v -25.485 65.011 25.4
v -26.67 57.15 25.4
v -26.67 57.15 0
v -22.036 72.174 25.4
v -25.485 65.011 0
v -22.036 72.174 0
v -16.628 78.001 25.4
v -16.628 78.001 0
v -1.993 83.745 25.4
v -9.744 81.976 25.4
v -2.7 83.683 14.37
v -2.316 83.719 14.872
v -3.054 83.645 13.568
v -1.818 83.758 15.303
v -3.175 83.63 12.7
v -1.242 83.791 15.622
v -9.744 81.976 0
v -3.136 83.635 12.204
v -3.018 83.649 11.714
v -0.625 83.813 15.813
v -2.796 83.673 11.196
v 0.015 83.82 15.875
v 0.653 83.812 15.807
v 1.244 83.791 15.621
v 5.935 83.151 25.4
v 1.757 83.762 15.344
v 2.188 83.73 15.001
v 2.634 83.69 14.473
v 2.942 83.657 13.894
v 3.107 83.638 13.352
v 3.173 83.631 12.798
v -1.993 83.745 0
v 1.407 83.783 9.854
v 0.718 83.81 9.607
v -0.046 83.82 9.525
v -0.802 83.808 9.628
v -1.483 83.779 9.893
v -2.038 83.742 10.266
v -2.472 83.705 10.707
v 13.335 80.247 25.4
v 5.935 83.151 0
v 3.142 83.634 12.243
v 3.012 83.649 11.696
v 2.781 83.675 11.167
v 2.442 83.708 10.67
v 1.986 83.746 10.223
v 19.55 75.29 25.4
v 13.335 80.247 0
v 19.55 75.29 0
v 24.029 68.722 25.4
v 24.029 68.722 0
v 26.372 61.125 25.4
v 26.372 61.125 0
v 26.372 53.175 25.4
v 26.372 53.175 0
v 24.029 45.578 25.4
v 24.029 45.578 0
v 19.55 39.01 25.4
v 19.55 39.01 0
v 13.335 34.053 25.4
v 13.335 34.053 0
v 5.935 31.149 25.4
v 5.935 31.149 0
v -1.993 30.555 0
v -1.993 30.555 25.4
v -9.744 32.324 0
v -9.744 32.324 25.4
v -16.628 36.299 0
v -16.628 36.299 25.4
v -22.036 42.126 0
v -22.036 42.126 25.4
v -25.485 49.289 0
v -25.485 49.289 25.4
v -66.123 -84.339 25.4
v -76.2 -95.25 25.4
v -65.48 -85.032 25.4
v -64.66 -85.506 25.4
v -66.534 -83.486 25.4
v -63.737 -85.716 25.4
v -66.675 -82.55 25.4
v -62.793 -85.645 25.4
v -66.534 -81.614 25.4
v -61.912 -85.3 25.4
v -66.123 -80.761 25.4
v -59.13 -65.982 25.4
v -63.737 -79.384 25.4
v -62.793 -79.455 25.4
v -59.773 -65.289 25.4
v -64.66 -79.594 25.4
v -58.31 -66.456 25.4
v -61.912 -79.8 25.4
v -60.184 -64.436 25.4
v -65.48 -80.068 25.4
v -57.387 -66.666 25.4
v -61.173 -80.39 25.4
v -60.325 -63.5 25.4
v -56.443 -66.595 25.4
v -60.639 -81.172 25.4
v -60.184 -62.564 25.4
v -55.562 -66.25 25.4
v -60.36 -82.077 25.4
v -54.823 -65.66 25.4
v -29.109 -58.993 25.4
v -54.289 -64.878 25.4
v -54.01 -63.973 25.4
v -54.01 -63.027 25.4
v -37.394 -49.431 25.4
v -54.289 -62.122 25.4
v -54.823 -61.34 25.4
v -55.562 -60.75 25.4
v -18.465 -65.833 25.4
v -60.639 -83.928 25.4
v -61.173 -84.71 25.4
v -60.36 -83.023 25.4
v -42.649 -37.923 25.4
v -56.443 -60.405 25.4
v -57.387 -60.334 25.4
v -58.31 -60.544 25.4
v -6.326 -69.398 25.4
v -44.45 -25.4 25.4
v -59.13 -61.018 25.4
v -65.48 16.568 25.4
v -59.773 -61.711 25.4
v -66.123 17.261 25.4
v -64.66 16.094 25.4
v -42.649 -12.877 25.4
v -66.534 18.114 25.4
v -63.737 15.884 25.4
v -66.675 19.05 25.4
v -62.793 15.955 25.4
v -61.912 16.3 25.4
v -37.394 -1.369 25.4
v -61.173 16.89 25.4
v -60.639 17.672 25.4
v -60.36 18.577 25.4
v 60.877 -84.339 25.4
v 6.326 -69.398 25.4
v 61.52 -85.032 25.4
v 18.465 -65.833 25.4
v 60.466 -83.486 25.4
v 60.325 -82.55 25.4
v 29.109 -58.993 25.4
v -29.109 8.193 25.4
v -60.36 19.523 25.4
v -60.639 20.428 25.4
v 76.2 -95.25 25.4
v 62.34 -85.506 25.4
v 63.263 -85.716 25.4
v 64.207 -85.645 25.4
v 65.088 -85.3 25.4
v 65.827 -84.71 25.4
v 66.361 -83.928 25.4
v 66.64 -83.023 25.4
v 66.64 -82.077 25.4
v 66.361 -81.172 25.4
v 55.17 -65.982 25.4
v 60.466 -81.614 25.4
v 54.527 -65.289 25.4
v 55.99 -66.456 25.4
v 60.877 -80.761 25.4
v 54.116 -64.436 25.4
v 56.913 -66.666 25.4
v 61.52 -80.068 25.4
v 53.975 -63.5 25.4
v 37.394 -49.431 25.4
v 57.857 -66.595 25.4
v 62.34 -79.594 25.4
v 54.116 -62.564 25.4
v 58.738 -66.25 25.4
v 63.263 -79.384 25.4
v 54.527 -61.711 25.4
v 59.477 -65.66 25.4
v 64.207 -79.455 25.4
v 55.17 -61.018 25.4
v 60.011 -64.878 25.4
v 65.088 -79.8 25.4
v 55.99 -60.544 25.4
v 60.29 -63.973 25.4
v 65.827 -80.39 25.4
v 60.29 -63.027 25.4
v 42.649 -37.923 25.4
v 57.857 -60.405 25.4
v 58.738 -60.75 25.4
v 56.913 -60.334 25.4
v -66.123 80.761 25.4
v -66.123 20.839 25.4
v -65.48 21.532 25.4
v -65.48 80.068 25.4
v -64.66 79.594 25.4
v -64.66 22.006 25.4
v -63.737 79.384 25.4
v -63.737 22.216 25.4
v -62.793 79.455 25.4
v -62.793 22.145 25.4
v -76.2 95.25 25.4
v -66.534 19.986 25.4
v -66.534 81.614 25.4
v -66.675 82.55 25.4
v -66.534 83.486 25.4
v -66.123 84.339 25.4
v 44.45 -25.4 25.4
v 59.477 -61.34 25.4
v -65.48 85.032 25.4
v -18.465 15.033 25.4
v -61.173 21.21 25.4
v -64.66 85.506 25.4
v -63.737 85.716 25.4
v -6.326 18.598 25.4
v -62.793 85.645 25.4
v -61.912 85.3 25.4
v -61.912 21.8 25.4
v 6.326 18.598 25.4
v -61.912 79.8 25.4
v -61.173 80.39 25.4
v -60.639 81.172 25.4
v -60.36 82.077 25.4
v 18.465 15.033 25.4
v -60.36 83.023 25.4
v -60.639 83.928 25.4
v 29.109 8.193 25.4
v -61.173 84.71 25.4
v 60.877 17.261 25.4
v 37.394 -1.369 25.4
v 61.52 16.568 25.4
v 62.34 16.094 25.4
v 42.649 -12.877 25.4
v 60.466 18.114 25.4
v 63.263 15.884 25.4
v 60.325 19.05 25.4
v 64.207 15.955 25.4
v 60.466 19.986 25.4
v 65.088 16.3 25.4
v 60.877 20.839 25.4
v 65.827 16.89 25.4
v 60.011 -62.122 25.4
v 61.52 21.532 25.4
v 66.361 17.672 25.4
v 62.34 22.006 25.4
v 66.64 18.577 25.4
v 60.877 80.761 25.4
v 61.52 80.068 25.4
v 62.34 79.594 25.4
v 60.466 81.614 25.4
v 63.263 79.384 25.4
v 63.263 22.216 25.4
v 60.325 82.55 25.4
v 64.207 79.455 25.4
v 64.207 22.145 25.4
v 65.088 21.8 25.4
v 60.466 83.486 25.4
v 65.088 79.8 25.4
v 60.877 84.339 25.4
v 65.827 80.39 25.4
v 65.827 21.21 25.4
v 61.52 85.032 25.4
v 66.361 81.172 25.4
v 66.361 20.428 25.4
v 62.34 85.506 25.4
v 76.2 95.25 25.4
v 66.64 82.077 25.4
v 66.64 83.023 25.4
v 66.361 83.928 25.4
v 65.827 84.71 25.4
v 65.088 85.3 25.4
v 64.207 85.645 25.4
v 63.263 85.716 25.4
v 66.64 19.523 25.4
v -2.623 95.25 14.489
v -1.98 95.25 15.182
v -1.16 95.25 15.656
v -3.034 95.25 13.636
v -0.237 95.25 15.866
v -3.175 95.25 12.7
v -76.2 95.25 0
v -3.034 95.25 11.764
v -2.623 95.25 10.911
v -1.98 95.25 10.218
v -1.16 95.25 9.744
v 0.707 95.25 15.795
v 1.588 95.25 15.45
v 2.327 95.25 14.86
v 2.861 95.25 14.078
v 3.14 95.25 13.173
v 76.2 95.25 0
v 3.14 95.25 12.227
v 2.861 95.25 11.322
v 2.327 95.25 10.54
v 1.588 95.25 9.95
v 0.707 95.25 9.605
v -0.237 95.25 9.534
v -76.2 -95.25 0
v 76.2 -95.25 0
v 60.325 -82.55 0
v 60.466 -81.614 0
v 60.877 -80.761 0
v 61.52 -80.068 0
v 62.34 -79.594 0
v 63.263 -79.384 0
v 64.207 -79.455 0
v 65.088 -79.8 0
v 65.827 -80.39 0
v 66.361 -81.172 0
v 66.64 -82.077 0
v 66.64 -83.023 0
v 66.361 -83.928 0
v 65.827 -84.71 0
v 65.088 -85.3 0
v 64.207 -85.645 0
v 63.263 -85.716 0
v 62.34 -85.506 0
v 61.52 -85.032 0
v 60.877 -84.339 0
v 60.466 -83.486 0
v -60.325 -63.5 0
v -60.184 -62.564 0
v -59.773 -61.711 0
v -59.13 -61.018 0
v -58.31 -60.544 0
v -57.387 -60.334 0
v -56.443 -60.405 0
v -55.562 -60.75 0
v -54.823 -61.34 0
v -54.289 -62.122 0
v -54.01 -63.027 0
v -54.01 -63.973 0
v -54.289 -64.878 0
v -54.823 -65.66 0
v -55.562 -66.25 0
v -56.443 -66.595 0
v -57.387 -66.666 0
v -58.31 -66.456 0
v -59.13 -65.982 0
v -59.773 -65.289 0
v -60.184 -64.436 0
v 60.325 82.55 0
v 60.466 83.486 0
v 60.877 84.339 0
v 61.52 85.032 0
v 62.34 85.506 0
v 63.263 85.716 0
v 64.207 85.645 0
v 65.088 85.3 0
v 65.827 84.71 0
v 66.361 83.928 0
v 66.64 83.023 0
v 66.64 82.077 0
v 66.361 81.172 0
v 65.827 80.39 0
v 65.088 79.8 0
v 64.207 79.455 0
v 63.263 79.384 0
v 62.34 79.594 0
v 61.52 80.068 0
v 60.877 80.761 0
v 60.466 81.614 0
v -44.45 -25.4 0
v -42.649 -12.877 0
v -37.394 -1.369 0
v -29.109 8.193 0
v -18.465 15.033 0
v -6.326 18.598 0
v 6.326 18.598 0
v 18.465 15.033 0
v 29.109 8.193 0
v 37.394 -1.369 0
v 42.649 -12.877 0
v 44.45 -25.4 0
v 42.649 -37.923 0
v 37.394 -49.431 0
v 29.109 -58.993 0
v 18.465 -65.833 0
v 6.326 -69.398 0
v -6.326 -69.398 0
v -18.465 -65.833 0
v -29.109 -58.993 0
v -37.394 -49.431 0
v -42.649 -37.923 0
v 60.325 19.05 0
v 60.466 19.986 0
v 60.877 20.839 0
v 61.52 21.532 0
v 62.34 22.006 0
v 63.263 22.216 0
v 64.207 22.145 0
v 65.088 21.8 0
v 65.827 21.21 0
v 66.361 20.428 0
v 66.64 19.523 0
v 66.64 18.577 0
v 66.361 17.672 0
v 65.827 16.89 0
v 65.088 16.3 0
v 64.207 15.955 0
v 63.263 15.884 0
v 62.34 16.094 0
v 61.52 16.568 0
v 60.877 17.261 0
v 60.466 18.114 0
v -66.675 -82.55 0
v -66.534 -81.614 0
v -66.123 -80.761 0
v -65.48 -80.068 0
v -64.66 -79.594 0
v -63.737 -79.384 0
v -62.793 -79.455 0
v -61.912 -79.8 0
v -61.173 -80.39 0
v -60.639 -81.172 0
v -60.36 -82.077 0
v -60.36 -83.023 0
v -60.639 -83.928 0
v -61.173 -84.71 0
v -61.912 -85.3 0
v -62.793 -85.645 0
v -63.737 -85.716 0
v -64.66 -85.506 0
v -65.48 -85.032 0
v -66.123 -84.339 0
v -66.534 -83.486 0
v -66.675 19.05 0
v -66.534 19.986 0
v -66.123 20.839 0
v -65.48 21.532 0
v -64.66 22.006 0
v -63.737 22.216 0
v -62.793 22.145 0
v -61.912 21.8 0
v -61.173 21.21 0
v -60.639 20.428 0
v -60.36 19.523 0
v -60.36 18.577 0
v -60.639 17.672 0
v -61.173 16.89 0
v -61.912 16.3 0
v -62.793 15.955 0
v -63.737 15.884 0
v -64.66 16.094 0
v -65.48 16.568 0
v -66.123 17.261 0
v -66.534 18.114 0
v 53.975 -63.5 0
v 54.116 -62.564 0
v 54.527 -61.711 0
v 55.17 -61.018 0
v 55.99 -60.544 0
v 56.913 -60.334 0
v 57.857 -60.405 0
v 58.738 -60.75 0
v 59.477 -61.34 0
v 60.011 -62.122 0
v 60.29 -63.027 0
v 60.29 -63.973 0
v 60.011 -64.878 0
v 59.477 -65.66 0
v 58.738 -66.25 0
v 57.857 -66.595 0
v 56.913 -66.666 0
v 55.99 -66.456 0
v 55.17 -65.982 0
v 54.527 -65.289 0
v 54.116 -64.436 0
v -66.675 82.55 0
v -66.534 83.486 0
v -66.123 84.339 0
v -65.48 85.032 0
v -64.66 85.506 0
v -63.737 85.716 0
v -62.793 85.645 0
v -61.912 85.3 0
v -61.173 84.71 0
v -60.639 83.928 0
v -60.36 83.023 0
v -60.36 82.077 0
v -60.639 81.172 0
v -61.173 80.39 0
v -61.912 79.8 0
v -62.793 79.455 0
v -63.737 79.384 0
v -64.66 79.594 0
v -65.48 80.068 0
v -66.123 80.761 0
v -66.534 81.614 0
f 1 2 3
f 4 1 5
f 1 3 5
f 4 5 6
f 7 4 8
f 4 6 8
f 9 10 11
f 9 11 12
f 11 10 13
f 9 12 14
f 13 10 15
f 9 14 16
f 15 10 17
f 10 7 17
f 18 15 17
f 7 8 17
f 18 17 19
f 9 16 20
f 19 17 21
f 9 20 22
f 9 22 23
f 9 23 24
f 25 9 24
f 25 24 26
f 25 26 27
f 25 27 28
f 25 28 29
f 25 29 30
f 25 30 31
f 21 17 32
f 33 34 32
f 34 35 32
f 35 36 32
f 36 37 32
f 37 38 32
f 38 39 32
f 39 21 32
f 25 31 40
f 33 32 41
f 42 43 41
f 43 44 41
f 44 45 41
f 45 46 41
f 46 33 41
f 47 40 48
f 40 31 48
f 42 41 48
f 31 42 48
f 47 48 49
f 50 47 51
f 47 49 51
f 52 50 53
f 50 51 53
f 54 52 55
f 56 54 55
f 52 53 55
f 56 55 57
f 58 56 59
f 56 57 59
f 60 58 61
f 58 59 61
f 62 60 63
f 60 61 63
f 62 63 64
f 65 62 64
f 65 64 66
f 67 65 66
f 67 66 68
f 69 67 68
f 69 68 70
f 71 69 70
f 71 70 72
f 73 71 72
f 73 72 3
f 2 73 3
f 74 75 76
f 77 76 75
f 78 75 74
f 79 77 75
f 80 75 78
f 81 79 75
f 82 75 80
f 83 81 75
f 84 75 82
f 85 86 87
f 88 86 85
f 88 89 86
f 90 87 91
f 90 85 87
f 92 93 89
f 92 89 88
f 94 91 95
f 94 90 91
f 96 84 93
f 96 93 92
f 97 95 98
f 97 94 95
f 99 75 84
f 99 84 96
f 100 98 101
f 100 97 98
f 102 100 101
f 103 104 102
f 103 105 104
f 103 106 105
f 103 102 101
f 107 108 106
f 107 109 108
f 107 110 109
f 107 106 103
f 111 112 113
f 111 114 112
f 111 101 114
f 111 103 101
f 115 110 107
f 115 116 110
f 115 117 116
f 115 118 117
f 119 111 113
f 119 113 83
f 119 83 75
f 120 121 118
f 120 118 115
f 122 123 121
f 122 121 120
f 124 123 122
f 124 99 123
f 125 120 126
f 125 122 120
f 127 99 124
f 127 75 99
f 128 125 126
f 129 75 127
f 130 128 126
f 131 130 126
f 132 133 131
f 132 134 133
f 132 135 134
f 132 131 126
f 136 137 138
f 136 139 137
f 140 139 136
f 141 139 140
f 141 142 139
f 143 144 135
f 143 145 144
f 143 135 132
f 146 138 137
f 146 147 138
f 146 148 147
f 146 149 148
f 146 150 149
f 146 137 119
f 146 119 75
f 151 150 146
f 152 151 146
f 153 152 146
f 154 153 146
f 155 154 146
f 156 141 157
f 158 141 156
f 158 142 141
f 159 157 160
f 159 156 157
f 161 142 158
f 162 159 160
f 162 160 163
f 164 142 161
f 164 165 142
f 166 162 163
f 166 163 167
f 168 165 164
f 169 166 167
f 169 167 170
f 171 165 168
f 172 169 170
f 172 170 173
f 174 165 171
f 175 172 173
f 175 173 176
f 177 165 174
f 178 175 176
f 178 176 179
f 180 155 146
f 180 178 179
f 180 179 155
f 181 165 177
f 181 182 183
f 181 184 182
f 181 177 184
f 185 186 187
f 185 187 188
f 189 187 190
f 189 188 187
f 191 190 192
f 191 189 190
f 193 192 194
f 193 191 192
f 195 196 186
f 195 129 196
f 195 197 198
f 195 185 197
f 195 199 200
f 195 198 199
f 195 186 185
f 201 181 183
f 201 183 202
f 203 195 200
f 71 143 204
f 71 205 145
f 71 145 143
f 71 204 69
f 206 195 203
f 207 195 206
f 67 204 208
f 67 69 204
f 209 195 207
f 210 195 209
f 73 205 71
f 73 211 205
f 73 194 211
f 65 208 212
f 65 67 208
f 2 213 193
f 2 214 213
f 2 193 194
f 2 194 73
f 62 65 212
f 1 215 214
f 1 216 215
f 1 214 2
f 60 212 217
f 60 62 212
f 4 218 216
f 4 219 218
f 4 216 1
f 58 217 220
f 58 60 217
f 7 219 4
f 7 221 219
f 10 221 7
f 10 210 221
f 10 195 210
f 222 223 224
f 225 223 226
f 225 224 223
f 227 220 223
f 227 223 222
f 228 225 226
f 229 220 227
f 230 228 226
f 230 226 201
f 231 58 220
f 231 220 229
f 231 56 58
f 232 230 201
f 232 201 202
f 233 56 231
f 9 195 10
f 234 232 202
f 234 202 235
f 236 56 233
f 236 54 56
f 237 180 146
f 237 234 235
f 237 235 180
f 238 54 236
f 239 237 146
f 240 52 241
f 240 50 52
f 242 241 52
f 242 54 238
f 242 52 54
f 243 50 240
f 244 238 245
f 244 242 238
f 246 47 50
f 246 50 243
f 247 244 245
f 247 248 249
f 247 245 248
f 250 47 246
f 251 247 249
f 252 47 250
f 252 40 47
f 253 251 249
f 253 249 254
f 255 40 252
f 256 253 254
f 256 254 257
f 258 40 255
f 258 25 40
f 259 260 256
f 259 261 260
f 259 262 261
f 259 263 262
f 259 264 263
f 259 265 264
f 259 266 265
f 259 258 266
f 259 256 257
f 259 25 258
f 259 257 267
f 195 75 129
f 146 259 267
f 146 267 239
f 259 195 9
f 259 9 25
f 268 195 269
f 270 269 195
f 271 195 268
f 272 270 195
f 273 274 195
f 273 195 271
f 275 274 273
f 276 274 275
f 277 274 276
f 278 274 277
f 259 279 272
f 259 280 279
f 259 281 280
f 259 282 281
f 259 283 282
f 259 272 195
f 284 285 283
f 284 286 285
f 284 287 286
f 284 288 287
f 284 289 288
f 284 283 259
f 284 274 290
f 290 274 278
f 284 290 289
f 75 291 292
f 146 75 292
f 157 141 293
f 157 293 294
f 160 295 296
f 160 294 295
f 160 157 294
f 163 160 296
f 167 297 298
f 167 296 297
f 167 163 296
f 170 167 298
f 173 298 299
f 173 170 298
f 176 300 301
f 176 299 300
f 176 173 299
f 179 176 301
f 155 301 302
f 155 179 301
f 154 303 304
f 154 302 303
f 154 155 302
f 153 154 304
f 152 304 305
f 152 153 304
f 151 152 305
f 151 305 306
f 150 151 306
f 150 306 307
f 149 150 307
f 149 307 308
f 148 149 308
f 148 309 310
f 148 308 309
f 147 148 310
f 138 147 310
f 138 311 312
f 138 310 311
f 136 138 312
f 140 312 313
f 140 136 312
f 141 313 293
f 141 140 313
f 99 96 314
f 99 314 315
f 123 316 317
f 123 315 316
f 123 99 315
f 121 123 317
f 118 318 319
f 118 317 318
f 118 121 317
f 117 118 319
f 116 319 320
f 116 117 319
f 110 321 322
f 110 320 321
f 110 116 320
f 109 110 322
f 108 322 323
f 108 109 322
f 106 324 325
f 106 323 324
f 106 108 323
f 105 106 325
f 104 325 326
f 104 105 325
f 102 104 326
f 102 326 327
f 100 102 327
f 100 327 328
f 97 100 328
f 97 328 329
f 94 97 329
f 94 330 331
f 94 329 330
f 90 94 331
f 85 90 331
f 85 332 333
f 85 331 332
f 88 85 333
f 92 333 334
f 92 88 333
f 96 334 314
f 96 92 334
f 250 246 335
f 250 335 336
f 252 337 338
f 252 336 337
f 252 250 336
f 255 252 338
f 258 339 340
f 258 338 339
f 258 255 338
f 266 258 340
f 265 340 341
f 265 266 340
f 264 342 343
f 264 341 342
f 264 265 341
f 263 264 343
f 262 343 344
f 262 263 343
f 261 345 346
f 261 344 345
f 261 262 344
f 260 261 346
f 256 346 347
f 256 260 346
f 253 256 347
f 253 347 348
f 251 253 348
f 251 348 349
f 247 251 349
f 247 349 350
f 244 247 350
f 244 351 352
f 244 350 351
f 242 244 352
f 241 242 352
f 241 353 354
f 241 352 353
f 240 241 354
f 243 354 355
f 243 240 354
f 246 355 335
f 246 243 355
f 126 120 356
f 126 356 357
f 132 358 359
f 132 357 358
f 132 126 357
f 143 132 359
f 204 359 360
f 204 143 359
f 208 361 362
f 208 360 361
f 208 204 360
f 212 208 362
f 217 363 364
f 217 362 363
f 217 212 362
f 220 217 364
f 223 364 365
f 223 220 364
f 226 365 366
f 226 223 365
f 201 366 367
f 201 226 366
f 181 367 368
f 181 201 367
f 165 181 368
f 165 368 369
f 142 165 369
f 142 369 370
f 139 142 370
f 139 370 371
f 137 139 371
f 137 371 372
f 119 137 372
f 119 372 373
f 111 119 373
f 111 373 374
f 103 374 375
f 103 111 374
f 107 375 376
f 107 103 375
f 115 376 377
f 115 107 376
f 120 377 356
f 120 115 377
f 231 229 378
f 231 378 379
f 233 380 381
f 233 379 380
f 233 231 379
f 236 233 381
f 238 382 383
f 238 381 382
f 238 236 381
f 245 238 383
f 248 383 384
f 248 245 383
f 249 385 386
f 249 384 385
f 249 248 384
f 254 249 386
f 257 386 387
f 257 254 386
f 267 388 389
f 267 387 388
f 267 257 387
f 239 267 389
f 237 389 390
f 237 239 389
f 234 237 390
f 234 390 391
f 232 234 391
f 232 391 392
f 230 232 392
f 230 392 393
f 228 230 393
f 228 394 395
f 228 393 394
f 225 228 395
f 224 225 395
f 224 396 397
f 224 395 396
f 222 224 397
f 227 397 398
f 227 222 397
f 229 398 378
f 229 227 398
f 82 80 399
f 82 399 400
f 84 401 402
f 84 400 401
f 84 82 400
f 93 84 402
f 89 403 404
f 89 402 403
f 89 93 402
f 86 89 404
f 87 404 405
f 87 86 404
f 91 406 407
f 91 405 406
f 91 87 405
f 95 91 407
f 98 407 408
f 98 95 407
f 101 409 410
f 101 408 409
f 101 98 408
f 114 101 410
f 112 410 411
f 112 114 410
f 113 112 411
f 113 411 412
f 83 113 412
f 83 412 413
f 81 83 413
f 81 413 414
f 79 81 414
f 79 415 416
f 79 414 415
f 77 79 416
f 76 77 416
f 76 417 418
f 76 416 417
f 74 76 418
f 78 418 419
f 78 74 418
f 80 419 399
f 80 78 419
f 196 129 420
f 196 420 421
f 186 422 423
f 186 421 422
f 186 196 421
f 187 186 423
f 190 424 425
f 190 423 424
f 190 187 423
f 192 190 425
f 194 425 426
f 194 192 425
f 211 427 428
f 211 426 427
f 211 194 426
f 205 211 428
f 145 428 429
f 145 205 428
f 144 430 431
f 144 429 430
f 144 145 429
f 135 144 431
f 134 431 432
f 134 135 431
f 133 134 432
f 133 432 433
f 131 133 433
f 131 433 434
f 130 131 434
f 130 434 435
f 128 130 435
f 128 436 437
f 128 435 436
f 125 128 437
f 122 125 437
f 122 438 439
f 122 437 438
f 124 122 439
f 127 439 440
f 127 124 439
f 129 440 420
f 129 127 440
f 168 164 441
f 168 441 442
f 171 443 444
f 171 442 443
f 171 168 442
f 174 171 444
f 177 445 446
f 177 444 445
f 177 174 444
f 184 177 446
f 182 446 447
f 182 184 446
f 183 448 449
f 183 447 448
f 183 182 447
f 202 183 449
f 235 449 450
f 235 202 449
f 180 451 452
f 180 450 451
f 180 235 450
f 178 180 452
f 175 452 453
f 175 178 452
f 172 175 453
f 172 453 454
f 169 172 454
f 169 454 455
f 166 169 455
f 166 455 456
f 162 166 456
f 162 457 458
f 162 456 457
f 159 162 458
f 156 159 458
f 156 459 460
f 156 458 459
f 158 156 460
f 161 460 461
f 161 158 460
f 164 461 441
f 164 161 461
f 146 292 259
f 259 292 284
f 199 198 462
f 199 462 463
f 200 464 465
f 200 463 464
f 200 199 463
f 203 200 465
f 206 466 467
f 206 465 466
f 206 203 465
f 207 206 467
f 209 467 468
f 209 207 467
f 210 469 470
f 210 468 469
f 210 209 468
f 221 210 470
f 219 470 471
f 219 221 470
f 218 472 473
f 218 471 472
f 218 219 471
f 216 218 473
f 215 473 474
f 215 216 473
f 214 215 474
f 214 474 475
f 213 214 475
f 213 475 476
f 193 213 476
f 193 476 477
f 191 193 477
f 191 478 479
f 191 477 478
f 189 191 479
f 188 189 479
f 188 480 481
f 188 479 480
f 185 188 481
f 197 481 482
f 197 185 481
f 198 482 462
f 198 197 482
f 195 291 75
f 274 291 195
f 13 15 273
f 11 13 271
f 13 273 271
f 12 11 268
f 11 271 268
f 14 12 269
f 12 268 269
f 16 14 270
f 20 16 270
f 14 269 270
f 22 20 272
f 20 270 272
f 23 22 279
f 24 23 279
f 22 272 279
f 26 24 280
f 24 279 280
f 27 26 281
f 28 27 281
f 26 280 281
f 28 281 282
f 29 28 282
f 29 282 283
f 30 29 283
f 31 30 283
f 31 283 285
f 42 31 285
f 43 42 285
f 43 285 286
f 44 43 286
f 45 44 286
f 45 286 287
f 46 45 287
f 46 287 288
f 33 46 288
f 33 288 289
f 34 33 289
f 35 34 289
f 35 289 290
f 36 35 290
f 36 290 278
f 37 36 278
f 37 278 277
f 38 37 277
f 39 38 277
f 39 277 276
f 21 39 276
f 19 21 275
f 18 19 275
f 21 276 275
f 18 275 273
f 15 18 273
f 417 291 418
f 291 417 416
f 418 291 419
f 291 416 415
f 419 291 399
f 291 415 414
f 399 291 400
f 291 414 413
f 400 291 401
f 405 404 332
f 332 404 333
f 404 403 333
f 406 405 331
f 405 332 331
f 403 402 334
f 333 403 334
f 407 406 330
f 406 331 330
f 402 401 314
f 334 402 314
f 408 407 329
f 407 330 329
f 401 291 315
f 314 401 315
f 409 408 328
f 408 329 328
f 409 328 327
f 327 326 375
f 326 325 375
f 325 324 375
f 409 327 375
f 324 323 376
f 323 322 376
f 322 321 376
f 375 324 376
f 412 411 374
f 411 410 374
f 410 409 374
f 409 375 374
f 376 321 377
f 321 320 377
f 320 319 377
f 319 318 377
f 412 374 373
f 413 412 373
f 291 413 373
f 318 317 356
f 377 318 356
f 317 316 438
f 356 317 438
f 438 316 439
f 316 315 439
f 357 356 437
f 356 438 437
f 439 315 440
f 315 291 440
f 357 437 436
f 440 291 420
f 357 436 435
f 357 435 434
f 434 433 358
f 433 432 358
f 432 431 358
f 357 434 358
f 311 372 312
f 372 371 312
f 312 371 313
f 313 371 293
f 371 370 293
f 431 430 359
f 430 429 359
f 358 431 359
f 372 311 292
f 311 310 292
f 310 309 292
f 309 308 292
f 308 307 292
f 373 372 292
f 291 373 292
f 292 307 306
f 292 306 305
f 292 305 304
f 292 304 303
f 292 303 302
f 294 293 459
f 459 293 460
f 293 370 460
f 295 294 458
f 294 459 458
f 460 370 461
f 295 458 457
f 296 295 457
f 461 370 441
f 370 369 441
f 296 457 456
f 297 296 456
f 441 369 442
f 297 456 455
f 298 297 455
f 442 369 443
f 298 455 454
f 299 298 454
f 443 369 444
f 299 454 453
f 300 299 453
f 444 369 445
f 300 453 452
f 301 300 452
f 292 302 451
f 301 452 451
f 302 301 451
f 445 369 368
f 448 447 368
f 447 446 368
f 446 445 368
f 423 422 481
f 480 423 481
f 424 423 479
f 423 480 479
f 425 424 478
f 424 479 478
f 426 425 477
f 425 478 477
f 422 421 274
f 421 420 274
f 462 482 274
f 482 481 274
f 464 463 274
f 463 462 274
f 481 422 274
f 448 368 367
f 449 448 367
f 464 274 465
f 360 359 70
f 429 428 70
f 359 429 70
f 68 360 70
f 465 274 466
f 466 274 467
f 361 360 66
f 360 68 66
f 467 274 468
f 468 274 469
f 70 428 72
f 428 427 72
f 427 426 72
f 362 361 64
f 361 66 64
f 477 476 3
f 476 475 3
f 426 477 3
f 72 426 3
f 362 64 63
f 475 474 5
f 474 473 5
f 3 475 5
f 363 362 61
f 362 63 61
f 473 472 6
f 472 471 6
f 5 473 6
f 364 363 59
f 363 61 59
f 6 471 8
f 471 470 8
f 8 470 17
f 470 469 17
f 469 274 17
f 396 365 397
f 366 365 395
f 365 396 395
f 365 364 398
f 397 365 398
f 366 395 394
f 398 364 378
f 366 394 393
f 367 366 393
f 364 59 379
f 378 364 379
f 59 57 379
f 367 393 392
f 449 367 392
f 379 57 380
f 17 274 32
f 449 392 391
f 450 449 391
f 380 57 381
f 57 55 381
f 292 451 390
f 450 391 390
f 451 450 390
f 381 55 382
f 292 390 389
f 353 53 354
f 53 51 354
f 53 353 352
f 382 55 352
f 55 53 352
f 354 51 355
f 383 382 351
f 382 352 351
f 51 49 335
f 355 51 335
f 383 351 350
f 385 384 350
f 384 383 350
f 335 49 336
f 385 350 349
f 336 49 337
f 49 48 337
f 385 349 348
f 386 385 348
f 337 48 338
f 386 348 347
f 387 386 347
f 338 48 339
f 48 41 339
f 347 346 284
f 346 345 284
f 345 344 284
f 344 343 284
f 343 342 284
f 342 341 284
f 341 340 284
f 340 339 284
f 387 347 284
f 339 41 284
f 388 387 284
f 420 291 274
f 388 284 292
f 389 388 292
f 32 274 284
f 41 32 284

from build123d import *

# Parameters (mm, degrees)
SKETCH1_W               = 152.4
SKETCH1_H               = 190.5
BOSS_EXTRUDE1_DEPTH     = 25.4
SKETCH2_R               = 26.67
CUT_EXTRUDE1_DEPTH      = 125.595997127
CUT_EXTRUDE3_DEPTH      = 125.595997127
CUT_EXTRUDE3_DEPTH_BACK = 125.595997127
SKETCH3_R               = 3.175
CUT_EXTRUDE4_DEPTH      = 125.595997127
CUT_EXTRUDE4_DEPTH_BACK = 125.595997127
SKETCH4_R               = 44.45
CUT_EXTRUDE5_DEPTH      = 125.595997127
CUT_EXTRUDE5_DEPTH_BACK = 125.595997127
SKETCH6_R               = 3.175
CUT_EXTRUDE6_DEPTH      = 125.595997127
CUT_EXTRUDE6_DEPTH_BACK = 125.595997127
SKETCH7_R               = 3.175
SKETCH8_R               = 3.175
CUT_EXTRUDE7_DEPTH      = 25.4


with BuildPart() as part:
    # Sketch1 → Boss-Extrude1 (new body)
    with BuildSketch(Plane.XY):
        Rectangle(SKETCH1_W, SKETCH1_H)
    extrude(amount=BOSS_EXTRUDE1_DEPTH)

    # Sketch2 → Cut-Extrude1 (cut, through all)
    with BuildSketch(Plane(origin=(0, 0, 0), x_dir=(-1, 0, 0), z_dir=(0, 0, -1))):
        with Locations((0, 57.15)):
            Circle(SKETCH2_R)
    extrude(amount=-CUT_EXTRUDE1_DEPTH, mode=Mode.SUBTRACT)

    # Sketch3 → Cut-Extrude3 (cut, two sides: drawn at the far end of the back side and taken through both)
    with BuildSketch(Plane(origin=(0, 0, 0), x_dir=(-1, 0, 0), z_dir=(0, 0, -1)).offset(-CUT_EXTRUDE3_DEPTH_BACK)):
        with Locations((-63.5, 82.55)):
            Circle(SKETCH3_R)
        with Locations((63.5, 82.55)):
            Circle(SKETCH3_R)
        with Locations((63.5, -82.55)):
            Circle(SKETCH3_R)
        with Locations((-63.5, -82.55)):
            Circle(SKETCH3_R)
    extrude(amount=CUT_EXTRUDE3_DEPTH + CUT_EXTRUDE3_DEPTH_BACK, mode=Mode.SUBTRACT)

    # Sketch4 → Cut-Extrude4 (cut, two sides: drawn at the far end of the back side and taken through both)
    with BuildSketch(Plane(origin=(0, 0, 0), x_dir=(-1, 0, 0), z_dir=(0, 0, -1)).offset(-CUT_EXTRUDE4_DEPTH_BACK)):
        with Locations((0, -25.4)):
            Circle(SKETCH4_R)
    extrude(amount=CUT_EXTRUDE4_DEPTH + CUT_EXTRUDE4_DEPTH_BACK, mode=Mode.SUBTRACT)

    # Sketch6 → Cut-Extrude5 (cut, two sides: drawn at the far end of the back side and taken through both)
    with BuildSketch(Plane(origin=(0, 0, 0), x_dir=(-1, 0, 0), z_dir=(0, 0, -1)).offset(-CUT_EXTRUDE5_DEPTH_BACK)):
        with Locations((-63.5, 19.05)):
            Circle(SKETCH6_R)
        with Locations((63.5, 19.05)):
            Circle(SKETCH6_R)
    extrude(amount=CUT_EXTRUDE5_DEPTH + CUT_EXTRUDE5_DEPTH_BACK, mode=Mode.SUBTRACT)

    # Sketch7 → Cut-Extrude6 (cut, two sides: drawn at the far end of the back side and taken through both)
    with BuildSketch(Plane(origin=(0, 0, 0), x_dir=(-1, 0, 0), z_dir=(0, 0, -1)).offset(-CUT_EXTRUDE6_DEPTH_BACK)):
        with Locations((-57.15, -63.5)):
            Circle(SKETCH7_R)
        with Locations((57.15, -63.5)):
            Circle(SKETCH7_R)
    extrude(amount=CUT_EXTRUDE6_DEPTH + CUT_EXTRUDE6_DEPTH_BACK, mode=Mode.SUBTRACT)

    # Sketch8 → Cut-Extrude7 (cut)
    with BuildSketch(Plane(origin=(0, 95.25, 0), x_dir=(1, 0, 0), z_dir=(0, 1, 0))):
        with Locations(Location((0, -12.7, 0), (0, 0, 180))):
            Circle(SKETCH8_R)
    extrude(amount=-CUT_EXTRUDE7_DEPTH, mode=Mode.SUBTRACT)


solid = part.part
